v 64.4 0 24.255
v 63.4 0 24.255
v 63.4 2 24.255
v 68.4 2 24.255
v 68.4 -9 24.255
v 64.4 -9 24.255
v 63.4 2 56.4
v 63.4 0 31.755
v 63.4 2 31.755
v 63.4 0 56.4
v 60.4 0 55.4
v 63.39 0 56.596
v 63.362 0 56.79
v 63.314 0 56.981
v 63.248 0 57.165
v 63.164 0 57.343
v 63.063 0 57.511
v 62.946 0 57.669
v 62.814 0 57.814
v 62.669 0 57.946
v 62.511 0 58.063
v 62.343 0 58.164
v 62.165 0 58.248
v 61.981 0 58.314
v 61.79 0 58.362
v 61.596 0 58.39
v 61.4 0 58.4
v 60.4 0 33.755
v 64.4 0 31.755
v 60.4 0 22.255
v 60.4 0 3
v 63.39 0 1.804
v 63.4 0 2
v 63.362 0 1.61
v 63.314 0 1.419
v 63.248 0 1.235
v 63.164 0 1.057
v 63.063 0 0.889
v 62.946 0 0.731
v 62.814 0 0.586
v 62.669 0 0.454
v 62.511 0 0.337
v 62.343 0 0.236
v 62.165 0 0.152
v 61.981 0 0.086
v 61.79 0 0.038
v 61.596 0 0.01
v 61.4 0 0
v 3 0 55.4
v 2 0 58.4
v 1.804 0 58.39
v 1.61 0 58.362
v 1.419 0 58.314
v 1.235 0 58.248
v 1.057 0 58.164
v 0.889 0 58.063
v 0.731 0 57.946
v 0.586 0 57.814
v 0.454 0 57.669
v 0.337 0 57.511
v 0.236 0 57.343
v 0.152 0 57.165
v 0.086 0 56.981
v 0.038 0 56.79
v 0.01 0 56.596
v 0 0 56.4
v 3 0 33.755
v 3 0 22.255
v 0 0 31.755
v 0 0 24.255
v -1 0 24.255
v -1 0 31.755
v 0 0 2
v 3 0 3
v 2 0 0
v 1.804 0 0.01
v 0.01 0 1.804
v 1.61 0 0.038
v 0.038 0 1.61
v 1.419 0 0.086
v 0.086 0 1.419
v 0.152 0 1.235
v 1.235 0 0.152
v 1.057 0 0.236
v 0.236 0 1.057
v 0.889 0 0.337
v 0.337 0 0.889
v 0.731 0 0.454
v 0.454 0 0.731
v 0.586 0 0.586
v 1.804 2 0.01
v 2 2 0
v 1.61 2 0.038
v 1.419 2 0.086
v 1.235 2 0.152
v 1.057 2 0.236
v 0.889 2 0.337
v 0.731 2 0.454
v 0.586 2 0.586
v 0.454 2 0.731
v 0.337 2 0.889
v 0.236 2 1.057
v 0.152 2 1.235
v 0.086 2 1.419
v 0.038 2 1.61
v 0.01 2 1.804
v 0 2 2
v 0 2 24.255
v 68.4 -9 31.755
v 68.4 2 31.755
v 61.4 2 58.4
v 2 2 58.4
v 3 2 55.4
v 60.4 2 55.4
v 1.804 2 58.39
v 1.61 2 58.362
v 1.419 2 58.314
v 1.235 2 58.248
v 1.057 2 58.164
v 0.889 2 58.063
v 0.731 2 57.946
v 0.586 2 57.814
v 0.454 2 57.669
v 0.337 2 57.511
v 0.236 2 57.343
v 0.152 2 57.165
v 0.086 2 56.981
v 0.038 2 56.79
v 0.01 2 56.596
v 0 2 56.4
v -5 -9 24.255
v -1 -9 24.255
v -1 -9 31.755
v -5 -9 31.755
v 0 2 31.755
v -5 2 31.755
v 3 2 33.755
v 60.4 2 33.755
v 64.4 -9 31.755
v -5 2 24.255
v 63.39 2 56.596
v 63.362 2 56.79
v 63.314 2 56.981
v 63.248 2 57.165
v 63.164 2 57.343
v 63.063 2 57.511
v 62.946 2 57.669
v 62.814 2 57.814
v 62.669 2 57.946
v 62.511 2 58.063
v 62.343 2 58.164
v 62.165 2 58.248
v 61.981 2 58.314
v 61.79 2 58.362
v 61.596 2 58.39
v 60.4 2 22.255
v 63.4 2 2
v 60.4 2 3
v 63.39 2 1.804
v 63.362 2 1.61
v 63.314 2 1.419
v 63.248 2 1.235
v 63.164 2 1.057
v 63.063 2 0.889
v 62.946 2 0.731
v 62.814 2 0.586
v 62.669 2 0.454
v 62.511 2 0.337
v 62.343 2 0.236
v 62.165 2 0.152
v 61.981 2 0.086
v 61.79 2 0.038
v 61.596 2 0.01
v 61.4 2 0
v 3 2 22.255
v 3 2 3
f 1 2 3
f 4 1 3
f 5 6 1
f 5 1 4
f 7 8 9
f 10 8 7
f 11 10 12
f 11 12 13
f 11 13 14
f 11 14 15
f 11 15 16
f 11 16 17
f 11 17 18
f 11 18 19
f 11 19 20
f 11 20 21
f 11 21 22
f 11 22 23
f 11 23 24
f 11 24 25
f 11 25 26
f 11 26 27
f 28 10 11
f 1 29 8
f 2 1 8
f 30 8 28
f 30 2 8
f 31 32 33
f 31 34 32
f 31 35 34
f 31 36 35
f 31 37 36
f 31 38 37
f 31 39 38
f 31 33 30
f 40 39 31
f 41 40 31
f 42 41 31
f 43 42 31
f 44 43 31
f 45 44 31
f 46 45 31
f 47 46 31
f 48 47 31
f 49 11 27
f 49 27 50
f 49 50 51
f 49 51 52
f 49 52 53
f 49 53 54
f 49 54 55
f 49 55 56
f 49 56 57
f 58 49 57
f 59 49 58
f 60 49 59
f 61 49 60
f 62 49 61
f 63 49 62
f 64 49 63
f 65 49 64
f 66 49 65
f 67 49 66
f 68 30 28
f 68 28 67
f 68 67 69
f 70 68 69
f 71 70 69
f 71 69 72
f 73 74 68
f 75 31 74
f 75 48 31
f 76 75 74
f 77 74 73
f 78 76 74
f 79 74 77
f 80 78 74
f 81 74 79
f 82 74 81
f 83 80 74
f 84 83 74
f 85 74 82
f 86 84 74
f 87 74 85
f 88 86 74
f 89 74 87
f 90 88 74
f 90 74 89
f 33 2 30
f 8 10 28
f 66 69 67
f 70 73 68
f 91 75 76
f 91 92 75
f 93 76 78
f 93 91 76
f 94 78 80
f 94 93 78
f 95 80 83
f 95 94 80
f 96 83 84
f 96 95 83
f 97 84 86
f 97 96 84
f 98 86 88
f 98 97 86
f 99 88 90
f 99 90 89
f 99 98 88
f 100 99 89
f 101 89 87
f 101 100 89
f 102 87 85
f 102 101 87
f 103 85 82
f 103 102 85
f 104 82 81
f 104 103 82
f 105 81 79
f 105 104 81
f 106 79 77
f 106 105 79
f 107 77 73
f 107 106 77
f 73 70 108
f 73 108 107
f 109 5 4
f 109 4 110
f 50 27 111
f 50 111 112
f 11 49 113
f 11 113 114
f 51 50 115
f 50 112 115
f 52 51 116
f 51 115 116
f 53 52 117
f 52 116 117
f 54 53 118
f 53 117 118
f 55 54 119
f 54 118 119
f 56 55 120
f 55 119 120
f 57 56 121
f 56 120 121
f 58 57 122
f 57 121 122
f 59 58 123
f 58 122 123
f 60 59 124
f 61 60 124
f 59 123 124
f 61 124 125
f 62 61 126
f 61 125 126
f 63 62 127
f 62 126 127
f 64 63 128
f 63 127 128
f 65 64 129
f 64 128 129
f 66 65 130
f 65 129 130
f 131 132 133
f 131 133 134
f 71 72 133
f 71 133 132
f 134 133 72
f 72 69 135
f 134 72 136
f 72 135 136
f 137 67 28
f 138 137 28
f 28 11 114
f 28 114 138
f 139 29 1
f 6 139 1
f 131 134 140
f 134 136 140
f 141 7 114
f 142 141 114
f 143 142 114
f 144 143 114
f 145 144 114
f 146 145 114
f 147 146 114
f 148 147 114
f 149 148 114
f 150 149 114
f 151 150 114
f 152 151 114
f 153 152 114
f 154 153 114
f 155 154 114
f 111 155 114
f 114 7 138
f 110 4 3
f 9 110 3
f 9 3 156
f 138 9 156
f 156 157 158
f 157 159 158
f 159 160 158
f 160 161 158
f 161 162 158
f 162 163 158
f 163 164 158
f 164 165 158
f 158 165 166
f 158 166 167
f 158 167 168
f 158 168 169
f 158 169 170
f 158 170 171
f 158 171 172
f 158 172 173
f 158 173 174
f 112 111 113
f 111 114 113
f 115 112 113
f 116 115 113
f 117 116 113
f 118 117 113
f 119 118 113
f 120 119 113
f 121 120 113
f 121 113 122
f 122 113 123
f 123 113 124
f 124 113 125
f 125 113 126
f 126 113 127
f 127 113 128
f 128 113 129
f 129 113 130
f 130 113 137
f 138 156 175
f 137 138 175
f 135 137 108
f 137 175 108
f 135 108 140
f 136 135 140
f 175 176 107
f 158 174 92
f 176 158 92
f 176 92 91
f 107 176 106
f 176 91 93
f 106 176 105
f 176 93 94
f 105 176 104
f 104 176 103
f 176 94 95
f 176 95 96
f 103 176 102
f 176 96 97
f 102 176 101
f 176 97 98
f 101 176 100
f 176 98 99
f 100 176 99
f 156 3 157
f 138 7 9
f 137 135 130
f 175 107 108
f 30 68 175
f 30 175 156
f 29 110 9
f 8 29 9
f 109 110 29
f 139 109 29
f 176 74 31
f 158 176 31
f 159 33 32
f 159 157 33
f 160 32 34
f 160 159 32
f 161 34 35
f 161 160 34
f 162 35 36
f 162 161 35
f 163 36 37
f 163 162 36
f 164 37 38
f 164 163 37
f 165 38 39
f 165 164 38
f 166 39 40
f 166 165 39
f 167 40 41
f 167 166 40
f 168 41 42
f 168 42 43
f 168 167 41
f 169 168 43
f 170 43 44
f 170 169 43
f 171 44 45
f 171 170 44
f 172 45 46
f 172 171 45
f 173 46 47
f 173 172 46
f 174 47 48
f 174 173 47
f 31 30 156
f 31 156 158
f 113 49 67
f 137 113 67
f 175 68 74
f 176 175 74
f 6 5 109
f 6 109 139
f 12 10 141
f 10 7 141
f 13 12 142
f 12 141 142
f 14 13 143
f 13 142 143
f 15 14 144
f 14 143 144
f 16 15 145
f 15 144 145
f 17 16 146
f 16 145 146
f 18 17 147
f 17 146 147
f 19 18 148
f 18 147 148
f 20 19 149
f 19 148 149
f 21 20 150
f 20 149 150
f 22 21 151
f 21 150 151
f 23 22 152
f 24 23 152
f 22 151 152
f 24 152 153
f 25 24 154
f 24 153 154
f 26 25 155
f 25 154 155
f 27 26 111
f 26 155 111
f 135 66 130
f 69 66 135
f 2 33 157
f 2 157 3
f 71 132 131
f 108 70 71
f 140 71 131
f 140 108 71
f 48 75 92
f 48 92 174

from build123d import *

# Parameters (mm, degrees)
SKETCH_1_W      = 57.4
SKETCH_1_H      = 19.255
SKETCH_1_H_2    = 21.645
EXTRUDE_1_DEPTH = 2
FILLET_1_R      = 2
SKETCH_2_W      = 4
SKETCH_2_H      = 7.5
EXTRUDE_2_DEPTH = 9


with BuildPart() as part:
    # Эскиз1 → Бобышка-Вытянуть1 (new body)
    with BuildSketch(Plane(origin=(0, 0, 0), x_dir=(1, 0, 0), z_dir=(0, 1, 0))):
        Polygon((63.4, -24.255), (68.4, -24.255), (68.4, -31.755), (63.4, -31.755), (63.4, -58.4), (0, -58.4), (0, -31.755), (-5, -31.755), (-5, -24.255), (0, -24.255), (0, 0), (63.4, 0), align=None)
        with Locations((31.7, -12.6275)):
            Rectangle(SKETCH_1_W, SKETCH_1_H, mode=Mode.SUBTRACT)
        with Locations((31.7, -44.5775)):
            Rectangle(SKETCH_1_W, SKETCH_1_H_2, mode=Mode.SUBTRACT)
    extrude(amount=EXTRUDE_1_DEPTH)

    # Скругление1
    fillet_1_edges = [part.edges().sort_by_distance(p)[0] for p in [
        (0, 1, 0),
        (63.4, 1, 0),
        (63.4, 1, 58.4),
        (0, 1, 58.4),
    ]]
    fillet(fillet_1_edges, radius=FILLET_1_R)

    # Эскиз2 → Бобышка-Вытянуть2 (add)
    with BuildSketch(Plane(origin=(0, 0, 0), x_dir=(-1, 0, 0), z_dir=(0, -1, 0))):
        with Locations((3, -28.005)):
            Rectangle(SKETCH_2_W, SKETCH_2_H)
        with Locations((-66.4, -28.005)):
            Rectangle(SKETCH_2_W, SKETCH_2_H)
    extrude(amount=EXTRUDE_2_DEPTH)


solid = part.part
